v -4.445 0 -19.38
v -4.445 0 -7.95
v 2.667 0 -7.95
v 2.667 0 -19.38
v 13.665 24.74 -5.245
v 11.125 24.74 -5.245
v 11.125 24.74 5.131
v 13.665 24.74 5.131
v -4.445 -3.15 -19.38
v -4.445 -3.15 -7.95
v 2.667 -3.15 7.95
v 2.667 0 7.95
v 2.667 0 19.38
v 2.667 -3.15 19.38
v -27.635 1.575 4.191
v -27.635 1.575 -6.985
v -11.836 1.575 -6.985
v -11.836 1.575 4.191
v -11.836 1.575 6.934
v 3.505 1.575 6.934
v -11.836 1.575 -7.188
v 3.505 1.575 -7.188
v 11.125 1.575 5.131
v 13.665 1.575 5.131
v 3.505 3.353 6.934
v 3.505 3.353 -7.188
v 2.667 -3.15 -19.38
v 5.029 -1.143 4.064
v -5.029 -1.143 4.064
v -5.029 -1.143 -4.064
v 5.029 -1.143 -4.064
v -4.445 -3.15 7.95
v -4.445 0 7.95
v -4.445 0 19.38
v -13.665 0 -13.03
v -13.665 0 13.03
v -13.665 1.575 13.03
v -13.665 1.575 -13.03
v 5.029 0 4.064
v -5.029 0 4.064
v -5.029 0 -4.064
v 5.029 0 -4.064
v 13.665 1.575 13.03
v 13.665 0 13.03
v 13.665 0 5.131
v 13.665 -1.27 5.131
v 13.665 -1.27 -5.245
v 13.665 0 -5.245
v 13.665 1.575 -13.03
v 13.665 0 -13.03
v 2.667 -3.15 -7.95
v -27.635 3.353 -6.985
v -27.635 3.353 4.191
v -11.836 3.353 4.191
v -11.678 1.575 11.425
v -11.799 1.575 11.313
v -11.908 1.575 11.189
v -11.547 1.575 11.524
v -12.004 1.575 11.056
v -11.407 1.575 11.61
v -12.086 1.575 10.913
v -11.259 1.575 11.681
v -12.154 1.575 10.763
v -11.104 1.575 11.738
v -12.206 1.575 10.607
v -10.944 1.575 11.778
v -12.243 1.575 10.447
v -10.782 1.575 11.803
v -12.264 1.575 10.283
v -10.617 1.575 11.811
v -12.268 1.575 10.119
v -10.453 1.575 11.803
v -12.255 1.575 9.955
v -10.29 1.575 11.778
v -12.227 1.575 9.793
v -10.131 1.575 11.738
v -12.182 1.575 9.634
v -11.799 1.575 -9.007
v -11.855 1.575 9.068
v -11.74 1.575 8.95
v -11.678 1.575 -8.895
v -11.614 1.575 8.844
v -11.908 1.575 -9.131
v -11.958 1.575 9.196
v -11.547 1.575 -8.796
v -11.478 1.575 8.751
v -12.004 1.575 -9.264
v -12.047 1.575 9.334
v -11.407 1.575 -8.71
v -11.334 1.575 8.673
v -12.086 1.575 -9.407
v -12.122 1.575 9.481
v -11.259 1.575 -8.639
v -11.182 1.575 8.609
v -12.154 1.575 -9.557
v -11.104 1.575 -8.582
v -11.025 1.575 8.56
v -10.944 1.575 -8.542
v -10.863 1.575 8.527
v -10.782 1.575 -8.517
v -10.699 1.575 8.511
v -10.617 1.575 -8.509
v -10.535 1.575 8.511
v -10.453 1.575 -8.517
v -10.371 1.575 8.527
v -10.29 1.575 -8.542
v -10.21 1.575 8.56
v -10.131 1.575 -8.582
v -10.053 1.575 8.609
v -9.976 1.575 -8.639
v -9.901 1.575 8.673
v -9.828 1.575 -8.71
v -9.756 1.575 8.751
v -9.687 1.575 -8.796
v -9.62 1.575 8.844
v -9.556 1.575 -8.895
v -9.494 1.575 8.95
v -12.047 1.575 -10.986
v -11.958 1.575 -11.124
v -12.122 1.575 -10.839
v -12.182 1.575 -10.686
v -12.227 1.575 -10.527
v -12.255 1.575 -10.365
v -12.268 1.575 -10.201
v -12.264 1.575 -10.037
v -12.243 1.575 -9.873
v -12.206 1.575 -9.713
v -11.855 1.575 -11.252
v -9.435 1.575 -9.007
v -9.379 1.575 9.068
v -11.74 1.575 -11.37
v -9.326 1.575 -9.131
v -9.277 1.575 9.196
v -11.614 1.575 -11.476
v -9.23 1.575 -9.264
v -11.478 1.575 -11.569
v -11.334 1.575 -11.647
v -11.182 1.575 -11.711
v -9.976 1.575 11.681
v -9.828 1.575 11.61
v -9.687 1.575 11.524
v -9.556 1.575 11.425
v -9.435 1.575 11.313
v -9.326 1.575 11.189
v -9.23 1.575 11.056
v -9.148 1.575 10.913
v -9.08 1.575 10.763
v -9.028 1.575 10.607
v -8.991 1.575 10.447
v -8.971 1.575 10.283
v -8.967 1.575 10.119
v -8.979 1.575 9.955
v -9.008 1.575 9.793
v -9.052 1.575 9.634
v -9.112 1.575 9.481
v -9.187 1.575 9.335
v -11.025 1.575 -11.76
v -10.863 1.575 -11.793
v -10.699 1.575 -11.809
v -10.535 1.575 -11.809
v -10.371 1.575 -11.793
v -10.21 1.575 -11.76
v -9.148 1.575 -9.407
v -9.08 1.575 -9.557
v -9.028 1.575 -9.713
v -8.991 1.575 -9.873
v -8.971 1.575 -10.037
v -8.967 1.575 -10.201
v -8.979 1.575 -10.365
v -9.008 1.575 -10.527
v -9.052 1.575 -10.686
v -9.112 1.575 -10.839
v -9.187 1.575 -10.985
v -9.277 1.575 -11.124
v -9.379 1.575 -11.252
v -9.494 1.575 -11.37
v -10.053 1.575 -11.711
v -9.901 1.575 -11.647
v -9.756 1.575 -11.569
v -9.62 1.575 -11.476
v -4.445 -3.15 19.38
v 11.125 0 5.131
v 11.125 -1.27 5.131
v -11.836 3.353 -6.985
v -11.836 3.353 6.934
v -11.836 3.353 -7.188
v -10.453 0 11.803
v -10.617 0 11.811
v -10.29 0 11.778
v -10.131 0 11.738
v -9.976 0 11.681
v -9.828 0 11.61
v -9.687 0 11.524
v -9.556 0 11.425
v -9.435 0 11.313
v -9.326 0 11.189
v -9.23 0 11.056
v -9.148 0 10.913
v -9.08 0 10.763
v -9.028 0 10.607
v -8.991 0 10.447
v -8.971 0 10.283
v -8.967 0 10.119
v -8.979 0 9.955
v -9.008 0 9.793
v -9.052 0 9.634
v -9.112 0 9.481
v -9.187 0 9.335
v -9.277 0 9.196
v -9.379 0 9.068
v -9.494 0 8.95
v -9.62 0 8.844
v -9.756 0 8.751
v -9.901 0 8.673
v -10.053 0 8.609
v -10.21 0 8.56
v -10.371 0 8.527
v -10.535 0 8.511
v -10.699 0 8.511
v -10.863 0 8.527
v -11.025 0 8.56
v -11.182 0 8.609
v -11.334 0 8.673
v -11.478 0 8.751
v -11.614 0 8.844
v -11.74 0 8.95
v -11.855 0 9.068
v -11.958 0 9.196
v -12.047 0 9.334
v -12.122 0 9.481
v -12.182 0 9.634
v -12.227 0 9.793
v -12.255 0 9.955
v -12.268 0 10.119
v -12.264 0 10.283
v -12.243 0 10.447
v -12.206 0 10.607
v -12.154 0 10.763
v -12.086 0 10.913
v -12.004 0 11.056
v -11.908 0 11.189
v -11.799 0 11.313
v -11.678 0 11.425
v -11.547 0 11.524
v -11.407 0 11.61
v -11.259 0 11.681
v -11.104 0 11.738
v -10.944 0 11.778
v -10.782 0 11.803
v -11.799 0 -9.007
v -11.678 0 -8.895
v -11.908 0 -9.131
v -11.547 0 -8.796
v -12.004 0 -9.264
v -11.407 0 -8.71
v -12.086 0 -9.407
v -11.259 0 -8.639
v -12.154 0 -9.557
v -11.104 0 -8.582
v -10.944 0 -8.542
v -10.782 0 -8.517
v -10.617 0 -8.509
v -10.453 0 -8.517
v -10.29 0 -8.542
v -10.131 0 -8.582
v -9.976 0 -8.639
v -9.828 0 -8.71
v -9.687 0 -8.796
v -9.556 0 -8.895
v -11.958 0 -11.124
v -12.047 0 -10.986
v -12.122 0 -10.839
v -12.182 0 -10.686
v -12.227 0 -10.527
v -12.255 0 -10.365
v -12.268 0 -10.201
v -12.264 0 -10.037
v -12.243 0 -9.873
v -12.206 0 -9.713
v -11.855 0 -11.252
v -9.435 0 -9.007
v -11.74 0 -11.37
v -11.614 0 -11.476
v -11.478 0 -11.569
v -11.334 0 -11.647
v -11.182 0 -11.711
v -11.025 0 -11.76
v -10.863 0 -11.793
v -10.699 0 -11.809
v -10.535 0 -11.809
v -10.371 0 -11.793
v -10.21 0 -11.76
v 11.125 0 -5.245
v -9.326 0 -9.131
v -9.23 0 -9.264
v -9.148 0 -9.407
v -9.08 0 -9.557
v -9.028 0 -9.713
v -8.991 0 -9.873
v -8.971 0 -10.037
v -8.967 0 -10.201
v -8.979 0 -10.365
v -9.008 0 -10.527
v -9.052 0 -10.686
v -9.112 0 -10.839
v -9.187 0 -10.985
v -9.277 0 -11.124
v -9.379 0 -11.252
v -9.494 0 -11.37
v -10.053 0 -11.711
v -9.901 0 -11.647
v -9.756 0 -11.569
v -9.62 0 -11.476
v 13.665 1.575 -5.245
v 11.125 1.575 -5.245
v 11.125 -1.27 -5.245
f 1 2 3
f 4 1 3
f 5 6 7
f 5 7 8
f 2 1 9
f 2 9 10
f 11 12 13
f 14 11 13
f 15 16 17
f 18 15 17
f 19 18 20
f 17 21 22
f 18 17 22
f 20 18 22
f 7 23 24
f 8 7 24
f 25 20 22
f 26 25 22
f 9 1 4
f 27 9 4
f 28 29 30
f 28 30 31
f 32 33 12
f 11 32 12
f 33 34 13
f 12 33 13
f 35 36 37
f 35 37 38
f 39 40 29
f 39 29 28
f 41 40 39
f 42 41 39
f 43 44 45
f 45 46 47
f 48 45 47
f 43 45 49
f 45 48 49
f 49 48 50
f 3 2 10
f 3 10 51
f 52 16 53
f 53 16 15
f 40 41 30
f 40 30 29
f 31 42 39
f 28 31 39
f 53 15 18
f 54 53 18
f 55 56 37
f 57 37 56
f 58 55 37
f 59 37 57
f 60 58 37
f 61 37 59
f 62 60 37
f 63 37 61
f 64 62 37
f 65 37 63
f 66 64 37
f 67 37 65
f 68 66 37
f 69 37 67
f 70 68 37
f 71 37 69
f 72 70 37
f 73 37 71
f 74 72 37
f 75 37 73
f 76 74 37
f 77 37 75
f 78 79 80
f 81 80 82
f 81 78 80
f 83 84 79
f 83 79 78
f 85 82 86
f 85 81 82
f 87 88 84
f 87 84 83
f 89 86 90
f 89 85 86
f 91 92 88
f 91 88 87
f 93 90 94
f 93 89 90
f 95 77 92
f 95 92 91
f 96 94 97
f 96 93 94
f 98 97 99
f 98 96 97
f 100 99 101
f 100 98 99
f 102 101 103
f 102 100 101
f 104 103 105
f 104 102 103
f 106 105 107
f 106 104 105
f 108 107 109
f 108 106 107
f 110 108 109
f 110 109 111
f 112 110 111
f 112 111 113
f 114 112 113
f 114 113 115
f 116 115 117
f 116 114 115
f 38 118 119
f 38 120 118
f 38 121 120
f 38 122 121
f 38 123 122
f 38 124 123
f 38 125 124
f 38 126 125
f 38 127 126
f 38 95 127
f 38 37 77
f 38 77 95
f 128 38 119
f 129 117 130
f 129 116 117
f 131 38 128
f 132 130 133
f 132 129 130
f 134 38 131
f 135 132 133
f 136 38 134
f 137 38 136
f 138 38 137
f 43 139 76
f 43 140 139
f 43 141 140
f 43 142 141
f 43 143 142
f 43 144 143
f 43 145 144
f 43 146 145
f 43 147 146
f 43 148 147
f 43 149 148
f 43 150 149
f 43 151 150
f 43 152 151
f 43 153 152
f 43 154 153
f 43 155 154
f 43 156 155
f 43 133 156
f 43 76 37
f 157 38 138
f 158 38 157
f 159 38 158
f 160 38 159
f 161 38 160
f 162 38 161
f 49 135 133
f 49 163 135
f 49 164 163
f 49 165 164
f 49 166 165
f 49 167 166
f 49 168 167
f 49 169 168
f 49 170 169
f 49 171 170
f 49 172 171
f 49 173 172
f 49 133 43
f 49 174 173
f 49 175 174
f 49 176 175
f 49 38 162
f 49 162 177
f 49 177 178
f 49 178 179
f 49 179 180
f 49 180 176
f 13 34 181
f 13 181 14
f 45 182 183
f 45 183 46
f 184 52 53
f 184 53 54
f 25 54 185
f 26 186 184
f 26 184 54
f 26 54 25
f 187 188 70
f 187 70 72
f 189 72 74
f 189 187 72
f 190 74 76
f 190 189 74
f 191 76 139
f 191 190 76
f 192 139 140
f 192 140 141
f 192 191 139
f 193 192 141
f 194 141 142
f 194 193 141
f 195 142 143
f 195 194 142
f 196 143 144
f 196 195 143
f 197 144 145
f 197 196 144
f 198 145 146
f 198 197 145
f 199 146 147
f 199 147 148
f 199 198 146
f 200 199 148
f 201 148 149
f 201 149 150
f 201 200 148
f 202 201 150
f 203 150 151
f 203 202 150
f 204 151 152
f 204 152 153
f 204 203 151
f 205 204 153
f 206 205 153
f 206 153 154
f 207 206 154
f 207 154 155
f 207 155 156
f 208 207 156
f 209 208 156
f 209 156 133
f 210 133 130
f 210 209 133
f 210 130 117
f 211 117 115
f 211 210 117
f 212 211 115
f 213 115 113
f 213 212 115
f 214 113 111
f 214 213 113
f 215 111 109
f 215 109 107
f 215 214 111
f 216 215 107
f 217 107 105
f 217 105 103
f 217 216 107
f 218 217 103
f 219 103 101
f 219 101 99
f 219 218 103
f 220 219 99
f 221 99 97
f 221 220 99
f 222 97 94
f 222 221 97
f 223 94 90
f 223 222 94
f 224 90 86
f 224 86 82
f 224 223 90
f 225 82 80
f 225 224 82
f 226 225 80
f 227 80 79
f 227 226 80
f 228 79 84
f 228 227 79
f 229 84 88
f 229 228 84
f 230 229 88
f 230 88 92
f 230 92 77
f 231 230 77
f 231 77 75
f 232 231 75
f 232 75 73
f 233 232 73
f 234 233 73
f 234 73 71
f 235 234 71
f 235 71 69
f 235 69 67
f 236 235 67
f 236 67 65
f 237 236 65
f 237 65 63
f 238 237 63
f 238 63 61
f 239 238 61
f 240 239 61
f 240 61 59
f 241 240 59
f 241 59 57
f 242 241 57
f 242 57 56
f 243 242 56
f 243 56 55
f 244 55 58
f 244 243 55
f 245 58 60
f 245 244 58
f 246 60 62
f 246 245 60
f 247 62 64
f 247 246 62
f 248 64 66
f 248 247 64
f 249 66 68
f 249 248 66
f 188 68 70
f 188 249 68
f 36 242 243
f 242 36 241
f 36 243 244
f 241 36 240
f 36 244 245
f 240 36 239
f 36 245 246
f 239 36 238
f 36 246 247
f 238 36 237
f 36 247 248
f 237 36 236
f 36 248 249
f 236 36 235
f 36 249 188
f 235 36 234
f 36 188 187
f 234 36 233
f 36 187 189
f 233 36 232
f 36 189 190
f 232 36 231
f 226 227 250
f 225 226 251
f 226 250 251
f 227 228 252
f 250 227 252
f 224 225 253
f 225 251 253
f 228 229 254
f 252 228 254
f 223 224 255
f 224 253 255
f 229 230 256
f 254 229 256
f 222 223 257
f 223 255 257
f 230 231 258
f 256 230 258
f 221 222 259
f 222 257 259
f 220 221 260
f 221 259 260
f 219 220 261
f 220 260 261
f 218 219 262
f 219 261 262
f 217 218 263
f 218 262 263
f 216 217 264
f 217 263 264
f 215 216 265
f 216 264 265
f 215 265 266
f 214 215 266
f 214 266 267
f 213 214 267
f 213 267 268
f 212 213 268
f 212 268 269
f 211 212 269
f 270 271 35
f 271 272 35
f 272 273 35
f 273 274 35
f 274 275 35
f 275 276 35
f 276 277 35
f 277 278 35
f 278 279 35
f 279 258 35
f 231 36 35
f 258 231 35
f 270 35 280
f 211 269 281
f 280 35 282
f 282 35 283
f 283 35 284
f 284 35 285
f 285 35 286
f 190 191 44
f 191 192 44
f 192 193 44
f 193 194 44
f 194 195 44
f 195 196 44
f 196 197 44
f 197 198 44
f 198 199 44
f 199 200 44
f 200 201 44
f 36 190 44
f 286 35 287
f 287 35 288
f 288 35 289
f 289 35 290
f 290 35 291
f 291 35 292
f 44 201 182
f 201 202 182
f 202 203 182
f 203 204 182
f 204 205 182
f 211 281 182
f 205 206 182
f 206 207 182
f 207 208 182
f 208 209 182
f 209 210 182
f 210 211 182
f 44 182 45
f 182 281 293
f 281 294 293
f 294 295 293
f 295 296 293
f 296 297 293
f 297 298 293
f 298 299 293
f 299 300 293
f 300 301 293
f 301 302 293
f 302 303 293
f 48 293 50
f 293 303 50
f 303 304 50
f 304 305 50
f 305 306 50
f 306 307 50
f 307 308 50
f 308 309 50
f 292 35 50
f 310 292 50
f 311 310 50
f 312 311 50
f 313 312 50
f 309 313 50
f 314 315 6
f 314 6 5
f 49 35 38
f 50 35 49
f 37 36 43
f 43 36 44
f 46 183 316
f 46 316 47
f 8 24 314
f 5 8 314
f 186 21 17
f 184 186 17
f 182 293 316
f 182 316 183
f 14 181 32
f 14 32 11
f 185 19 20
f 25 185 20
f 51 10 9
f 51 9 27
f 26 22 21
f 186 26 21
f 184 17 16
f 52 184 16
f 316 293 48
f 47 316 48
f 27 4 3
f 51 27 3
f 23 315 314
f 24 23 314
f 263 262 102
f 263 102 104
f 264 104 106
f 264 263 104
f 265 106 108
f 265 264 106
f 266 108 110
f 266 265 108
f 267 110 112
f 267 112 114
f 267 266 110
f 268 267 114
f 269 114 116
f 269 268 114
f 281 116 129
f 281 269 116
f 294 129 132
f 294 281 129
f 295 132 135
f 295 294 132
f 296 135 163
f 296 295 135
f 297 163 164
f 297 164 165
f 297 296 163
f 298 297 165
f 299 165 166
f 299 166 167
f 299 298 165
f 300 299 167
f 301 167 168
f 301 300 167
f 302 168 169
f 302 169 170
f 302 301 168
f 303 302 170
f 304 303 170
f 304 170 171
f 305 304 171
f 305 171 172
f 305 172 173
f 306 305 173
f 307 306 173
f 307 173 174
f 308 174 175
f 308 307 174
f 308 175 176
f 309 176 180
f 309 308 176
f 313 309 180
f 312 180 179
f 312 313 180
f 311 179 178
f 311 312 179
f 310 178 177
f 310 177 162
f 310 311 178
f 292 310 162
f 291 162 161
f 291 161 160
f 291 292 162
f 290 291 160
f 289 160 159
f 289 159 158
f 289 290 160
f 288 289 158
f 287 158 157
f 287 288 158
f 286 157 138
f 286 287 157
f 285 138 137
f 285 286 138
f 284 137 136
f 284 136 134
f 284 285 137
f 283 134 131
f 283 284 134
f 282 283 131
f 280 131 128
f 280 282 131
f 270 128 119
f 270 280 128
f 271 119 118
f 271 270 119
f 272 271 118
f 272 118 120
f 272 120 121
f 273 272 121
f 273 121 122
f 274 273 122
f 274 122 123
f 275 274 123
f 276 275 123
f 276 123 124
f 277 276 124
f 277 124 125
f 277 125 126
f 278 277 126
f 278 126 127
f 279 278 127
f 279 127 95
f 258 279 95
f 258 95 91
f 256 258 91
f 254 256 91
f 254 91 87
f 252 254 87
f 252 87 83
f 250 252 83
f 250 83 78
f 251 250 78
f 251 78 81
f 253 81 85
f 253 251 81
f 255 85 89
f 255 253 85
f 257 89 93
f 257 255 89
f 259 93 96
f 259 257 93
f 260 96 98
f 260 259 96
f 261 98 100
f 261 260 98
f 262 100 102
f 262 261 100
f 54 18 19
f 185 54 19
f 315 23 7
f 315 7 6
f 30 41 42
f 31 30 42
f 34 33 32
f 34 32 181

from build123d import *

# Parameters (mm, degrees)
SKETCH1_W             = 27.3304
SKETCH1_H             = 26.0604
SKETCH1_R             = 1.651
BOSS_EXTRUDE1_DEPTH   = 1.5748
BOSS_EXTRUDE2_DEPTH   = 1.778
SKETCH3_W             = 2.54
SKETCH3_H             = 10.3759
BOSS_EXTRUDE3_DEPTH   = 23.1648
SKETCH4_W             = 7.112
SKETCH4_H             = 11.43
BOSS_EXTRUDE4_DEPTH   = 3.1496
BOSS_EXTRUDE4_2_DEPTH = 3.1496
SKETCH5_W             = 2.54
SKETCH5_H             = 10.3759
BOSS_EXTRUDE5_DEPTH   = 1.27
SKETCH6_W             = 10.0584
SKETCH6_H             = 8.128
BOSS_EXTRUDE6_DEPTH   = 1.143


with BuildPart() as part:
    # Sketch1 → Boss-Extrude1 (new body)
    with BuildSketch(Plane(origin=(0, 0, 0), x_dir=(1, 0, 0), z_dir=(0, 1, 0))):
        Rectangle(SKETCH1_W, SKETCH1_H)
        with Locations(Location((-10.6172, 10.16, 0), (0, 0, 270))):
            Circle(SKETCH1_R, mode=Mode.SUBTRACT)
        with Locations(Location((-10.6172, -10.16, 0), (0, 0, 270))):
            Circle(SKETCH1_R, mode=Mode.SUBTRACT)
    extrude(amount=BOSS_EXTRUDE1_DEPTH)

    # Sketch5 → Boss-Extrude5 (add)
    with BuildSketch(Plane.XZ):
        with Locations((12.3952, -0.05715)):
            Rectangle(SKETCH5_W, SKETCH5_H)
    extrude(amount=BOSS_EXTRUDE5_DEPTH)


with BuildPart() as body_2:
    # Sketch2 → Boss-Extrude2 (new body)
    with BuildSketch(Plane(origin=(0, 1.5748, 0), x_dir=(1, 0, 0), z_dir=(0, 1, 0))):
        Polygon((-11.8364, 6.985), (-27.6352, 6.985), (-27.6352, -4.191), (-11.8364, -4.191), (-11.8364, -6.9342), (3.5052, -6.9342), (3.5052, 7.1882), (-11.8364, 7.1882), align=None)
    extrude(amount=BOSS_EXTRUDE2_DEPTH)


with BuildPart() as body_3:
    # Sketch3 → Boss-Extrude3 (new body)
    with BuildSketch(Plane(origin=(0, 1.5748, 0), x_dir=(1, 0, 0), z_dir=(0, 1, 0))):
        with Locations((12.3952, 0.05715)):
            Rectangle(SKETCH3_W, SKETCH3_H)
    extrude(amount=BOSS_EXTRUDE3_DEPTH)


with BuildPart() as body_4:
    # Sketch4 → Boss-Extrude4 (new body)
    with BuildSketch(Plane.XZ):
        with Locations((-0.889, 13.6652)):
            Rectangle(SKETCH4_W, SKETCH4_H)
    extrude(amount=BOSS_EXTRUDE4_DEPTH)


with BuildPart() as body_5:
    # Sketch4 → Boss-Extrude4 2 (new body)
    with BuildSketch(Plane.XZ):
        with Locations((-0.889, -13.6652)):
            Rectangle(SKETCH4_W, SKETCH4_H)
    extrude(amount=BOSS_EXTRUDE4_2_DEPTH)


with BuildPart() as body_6:
    # Sketch6 → Boss-Extrude6 (new body)
    with BuildSketch(Plane.XZ):
        Rectangle(SKETCH6_W, SKETCH6_H)
    extrude(amount=BOSS_EXTRUDE6_DEPTH)


solid = Compound([part.part, body_2.part, body_3.part, body_4.part, body_5.part, body_6.part])
